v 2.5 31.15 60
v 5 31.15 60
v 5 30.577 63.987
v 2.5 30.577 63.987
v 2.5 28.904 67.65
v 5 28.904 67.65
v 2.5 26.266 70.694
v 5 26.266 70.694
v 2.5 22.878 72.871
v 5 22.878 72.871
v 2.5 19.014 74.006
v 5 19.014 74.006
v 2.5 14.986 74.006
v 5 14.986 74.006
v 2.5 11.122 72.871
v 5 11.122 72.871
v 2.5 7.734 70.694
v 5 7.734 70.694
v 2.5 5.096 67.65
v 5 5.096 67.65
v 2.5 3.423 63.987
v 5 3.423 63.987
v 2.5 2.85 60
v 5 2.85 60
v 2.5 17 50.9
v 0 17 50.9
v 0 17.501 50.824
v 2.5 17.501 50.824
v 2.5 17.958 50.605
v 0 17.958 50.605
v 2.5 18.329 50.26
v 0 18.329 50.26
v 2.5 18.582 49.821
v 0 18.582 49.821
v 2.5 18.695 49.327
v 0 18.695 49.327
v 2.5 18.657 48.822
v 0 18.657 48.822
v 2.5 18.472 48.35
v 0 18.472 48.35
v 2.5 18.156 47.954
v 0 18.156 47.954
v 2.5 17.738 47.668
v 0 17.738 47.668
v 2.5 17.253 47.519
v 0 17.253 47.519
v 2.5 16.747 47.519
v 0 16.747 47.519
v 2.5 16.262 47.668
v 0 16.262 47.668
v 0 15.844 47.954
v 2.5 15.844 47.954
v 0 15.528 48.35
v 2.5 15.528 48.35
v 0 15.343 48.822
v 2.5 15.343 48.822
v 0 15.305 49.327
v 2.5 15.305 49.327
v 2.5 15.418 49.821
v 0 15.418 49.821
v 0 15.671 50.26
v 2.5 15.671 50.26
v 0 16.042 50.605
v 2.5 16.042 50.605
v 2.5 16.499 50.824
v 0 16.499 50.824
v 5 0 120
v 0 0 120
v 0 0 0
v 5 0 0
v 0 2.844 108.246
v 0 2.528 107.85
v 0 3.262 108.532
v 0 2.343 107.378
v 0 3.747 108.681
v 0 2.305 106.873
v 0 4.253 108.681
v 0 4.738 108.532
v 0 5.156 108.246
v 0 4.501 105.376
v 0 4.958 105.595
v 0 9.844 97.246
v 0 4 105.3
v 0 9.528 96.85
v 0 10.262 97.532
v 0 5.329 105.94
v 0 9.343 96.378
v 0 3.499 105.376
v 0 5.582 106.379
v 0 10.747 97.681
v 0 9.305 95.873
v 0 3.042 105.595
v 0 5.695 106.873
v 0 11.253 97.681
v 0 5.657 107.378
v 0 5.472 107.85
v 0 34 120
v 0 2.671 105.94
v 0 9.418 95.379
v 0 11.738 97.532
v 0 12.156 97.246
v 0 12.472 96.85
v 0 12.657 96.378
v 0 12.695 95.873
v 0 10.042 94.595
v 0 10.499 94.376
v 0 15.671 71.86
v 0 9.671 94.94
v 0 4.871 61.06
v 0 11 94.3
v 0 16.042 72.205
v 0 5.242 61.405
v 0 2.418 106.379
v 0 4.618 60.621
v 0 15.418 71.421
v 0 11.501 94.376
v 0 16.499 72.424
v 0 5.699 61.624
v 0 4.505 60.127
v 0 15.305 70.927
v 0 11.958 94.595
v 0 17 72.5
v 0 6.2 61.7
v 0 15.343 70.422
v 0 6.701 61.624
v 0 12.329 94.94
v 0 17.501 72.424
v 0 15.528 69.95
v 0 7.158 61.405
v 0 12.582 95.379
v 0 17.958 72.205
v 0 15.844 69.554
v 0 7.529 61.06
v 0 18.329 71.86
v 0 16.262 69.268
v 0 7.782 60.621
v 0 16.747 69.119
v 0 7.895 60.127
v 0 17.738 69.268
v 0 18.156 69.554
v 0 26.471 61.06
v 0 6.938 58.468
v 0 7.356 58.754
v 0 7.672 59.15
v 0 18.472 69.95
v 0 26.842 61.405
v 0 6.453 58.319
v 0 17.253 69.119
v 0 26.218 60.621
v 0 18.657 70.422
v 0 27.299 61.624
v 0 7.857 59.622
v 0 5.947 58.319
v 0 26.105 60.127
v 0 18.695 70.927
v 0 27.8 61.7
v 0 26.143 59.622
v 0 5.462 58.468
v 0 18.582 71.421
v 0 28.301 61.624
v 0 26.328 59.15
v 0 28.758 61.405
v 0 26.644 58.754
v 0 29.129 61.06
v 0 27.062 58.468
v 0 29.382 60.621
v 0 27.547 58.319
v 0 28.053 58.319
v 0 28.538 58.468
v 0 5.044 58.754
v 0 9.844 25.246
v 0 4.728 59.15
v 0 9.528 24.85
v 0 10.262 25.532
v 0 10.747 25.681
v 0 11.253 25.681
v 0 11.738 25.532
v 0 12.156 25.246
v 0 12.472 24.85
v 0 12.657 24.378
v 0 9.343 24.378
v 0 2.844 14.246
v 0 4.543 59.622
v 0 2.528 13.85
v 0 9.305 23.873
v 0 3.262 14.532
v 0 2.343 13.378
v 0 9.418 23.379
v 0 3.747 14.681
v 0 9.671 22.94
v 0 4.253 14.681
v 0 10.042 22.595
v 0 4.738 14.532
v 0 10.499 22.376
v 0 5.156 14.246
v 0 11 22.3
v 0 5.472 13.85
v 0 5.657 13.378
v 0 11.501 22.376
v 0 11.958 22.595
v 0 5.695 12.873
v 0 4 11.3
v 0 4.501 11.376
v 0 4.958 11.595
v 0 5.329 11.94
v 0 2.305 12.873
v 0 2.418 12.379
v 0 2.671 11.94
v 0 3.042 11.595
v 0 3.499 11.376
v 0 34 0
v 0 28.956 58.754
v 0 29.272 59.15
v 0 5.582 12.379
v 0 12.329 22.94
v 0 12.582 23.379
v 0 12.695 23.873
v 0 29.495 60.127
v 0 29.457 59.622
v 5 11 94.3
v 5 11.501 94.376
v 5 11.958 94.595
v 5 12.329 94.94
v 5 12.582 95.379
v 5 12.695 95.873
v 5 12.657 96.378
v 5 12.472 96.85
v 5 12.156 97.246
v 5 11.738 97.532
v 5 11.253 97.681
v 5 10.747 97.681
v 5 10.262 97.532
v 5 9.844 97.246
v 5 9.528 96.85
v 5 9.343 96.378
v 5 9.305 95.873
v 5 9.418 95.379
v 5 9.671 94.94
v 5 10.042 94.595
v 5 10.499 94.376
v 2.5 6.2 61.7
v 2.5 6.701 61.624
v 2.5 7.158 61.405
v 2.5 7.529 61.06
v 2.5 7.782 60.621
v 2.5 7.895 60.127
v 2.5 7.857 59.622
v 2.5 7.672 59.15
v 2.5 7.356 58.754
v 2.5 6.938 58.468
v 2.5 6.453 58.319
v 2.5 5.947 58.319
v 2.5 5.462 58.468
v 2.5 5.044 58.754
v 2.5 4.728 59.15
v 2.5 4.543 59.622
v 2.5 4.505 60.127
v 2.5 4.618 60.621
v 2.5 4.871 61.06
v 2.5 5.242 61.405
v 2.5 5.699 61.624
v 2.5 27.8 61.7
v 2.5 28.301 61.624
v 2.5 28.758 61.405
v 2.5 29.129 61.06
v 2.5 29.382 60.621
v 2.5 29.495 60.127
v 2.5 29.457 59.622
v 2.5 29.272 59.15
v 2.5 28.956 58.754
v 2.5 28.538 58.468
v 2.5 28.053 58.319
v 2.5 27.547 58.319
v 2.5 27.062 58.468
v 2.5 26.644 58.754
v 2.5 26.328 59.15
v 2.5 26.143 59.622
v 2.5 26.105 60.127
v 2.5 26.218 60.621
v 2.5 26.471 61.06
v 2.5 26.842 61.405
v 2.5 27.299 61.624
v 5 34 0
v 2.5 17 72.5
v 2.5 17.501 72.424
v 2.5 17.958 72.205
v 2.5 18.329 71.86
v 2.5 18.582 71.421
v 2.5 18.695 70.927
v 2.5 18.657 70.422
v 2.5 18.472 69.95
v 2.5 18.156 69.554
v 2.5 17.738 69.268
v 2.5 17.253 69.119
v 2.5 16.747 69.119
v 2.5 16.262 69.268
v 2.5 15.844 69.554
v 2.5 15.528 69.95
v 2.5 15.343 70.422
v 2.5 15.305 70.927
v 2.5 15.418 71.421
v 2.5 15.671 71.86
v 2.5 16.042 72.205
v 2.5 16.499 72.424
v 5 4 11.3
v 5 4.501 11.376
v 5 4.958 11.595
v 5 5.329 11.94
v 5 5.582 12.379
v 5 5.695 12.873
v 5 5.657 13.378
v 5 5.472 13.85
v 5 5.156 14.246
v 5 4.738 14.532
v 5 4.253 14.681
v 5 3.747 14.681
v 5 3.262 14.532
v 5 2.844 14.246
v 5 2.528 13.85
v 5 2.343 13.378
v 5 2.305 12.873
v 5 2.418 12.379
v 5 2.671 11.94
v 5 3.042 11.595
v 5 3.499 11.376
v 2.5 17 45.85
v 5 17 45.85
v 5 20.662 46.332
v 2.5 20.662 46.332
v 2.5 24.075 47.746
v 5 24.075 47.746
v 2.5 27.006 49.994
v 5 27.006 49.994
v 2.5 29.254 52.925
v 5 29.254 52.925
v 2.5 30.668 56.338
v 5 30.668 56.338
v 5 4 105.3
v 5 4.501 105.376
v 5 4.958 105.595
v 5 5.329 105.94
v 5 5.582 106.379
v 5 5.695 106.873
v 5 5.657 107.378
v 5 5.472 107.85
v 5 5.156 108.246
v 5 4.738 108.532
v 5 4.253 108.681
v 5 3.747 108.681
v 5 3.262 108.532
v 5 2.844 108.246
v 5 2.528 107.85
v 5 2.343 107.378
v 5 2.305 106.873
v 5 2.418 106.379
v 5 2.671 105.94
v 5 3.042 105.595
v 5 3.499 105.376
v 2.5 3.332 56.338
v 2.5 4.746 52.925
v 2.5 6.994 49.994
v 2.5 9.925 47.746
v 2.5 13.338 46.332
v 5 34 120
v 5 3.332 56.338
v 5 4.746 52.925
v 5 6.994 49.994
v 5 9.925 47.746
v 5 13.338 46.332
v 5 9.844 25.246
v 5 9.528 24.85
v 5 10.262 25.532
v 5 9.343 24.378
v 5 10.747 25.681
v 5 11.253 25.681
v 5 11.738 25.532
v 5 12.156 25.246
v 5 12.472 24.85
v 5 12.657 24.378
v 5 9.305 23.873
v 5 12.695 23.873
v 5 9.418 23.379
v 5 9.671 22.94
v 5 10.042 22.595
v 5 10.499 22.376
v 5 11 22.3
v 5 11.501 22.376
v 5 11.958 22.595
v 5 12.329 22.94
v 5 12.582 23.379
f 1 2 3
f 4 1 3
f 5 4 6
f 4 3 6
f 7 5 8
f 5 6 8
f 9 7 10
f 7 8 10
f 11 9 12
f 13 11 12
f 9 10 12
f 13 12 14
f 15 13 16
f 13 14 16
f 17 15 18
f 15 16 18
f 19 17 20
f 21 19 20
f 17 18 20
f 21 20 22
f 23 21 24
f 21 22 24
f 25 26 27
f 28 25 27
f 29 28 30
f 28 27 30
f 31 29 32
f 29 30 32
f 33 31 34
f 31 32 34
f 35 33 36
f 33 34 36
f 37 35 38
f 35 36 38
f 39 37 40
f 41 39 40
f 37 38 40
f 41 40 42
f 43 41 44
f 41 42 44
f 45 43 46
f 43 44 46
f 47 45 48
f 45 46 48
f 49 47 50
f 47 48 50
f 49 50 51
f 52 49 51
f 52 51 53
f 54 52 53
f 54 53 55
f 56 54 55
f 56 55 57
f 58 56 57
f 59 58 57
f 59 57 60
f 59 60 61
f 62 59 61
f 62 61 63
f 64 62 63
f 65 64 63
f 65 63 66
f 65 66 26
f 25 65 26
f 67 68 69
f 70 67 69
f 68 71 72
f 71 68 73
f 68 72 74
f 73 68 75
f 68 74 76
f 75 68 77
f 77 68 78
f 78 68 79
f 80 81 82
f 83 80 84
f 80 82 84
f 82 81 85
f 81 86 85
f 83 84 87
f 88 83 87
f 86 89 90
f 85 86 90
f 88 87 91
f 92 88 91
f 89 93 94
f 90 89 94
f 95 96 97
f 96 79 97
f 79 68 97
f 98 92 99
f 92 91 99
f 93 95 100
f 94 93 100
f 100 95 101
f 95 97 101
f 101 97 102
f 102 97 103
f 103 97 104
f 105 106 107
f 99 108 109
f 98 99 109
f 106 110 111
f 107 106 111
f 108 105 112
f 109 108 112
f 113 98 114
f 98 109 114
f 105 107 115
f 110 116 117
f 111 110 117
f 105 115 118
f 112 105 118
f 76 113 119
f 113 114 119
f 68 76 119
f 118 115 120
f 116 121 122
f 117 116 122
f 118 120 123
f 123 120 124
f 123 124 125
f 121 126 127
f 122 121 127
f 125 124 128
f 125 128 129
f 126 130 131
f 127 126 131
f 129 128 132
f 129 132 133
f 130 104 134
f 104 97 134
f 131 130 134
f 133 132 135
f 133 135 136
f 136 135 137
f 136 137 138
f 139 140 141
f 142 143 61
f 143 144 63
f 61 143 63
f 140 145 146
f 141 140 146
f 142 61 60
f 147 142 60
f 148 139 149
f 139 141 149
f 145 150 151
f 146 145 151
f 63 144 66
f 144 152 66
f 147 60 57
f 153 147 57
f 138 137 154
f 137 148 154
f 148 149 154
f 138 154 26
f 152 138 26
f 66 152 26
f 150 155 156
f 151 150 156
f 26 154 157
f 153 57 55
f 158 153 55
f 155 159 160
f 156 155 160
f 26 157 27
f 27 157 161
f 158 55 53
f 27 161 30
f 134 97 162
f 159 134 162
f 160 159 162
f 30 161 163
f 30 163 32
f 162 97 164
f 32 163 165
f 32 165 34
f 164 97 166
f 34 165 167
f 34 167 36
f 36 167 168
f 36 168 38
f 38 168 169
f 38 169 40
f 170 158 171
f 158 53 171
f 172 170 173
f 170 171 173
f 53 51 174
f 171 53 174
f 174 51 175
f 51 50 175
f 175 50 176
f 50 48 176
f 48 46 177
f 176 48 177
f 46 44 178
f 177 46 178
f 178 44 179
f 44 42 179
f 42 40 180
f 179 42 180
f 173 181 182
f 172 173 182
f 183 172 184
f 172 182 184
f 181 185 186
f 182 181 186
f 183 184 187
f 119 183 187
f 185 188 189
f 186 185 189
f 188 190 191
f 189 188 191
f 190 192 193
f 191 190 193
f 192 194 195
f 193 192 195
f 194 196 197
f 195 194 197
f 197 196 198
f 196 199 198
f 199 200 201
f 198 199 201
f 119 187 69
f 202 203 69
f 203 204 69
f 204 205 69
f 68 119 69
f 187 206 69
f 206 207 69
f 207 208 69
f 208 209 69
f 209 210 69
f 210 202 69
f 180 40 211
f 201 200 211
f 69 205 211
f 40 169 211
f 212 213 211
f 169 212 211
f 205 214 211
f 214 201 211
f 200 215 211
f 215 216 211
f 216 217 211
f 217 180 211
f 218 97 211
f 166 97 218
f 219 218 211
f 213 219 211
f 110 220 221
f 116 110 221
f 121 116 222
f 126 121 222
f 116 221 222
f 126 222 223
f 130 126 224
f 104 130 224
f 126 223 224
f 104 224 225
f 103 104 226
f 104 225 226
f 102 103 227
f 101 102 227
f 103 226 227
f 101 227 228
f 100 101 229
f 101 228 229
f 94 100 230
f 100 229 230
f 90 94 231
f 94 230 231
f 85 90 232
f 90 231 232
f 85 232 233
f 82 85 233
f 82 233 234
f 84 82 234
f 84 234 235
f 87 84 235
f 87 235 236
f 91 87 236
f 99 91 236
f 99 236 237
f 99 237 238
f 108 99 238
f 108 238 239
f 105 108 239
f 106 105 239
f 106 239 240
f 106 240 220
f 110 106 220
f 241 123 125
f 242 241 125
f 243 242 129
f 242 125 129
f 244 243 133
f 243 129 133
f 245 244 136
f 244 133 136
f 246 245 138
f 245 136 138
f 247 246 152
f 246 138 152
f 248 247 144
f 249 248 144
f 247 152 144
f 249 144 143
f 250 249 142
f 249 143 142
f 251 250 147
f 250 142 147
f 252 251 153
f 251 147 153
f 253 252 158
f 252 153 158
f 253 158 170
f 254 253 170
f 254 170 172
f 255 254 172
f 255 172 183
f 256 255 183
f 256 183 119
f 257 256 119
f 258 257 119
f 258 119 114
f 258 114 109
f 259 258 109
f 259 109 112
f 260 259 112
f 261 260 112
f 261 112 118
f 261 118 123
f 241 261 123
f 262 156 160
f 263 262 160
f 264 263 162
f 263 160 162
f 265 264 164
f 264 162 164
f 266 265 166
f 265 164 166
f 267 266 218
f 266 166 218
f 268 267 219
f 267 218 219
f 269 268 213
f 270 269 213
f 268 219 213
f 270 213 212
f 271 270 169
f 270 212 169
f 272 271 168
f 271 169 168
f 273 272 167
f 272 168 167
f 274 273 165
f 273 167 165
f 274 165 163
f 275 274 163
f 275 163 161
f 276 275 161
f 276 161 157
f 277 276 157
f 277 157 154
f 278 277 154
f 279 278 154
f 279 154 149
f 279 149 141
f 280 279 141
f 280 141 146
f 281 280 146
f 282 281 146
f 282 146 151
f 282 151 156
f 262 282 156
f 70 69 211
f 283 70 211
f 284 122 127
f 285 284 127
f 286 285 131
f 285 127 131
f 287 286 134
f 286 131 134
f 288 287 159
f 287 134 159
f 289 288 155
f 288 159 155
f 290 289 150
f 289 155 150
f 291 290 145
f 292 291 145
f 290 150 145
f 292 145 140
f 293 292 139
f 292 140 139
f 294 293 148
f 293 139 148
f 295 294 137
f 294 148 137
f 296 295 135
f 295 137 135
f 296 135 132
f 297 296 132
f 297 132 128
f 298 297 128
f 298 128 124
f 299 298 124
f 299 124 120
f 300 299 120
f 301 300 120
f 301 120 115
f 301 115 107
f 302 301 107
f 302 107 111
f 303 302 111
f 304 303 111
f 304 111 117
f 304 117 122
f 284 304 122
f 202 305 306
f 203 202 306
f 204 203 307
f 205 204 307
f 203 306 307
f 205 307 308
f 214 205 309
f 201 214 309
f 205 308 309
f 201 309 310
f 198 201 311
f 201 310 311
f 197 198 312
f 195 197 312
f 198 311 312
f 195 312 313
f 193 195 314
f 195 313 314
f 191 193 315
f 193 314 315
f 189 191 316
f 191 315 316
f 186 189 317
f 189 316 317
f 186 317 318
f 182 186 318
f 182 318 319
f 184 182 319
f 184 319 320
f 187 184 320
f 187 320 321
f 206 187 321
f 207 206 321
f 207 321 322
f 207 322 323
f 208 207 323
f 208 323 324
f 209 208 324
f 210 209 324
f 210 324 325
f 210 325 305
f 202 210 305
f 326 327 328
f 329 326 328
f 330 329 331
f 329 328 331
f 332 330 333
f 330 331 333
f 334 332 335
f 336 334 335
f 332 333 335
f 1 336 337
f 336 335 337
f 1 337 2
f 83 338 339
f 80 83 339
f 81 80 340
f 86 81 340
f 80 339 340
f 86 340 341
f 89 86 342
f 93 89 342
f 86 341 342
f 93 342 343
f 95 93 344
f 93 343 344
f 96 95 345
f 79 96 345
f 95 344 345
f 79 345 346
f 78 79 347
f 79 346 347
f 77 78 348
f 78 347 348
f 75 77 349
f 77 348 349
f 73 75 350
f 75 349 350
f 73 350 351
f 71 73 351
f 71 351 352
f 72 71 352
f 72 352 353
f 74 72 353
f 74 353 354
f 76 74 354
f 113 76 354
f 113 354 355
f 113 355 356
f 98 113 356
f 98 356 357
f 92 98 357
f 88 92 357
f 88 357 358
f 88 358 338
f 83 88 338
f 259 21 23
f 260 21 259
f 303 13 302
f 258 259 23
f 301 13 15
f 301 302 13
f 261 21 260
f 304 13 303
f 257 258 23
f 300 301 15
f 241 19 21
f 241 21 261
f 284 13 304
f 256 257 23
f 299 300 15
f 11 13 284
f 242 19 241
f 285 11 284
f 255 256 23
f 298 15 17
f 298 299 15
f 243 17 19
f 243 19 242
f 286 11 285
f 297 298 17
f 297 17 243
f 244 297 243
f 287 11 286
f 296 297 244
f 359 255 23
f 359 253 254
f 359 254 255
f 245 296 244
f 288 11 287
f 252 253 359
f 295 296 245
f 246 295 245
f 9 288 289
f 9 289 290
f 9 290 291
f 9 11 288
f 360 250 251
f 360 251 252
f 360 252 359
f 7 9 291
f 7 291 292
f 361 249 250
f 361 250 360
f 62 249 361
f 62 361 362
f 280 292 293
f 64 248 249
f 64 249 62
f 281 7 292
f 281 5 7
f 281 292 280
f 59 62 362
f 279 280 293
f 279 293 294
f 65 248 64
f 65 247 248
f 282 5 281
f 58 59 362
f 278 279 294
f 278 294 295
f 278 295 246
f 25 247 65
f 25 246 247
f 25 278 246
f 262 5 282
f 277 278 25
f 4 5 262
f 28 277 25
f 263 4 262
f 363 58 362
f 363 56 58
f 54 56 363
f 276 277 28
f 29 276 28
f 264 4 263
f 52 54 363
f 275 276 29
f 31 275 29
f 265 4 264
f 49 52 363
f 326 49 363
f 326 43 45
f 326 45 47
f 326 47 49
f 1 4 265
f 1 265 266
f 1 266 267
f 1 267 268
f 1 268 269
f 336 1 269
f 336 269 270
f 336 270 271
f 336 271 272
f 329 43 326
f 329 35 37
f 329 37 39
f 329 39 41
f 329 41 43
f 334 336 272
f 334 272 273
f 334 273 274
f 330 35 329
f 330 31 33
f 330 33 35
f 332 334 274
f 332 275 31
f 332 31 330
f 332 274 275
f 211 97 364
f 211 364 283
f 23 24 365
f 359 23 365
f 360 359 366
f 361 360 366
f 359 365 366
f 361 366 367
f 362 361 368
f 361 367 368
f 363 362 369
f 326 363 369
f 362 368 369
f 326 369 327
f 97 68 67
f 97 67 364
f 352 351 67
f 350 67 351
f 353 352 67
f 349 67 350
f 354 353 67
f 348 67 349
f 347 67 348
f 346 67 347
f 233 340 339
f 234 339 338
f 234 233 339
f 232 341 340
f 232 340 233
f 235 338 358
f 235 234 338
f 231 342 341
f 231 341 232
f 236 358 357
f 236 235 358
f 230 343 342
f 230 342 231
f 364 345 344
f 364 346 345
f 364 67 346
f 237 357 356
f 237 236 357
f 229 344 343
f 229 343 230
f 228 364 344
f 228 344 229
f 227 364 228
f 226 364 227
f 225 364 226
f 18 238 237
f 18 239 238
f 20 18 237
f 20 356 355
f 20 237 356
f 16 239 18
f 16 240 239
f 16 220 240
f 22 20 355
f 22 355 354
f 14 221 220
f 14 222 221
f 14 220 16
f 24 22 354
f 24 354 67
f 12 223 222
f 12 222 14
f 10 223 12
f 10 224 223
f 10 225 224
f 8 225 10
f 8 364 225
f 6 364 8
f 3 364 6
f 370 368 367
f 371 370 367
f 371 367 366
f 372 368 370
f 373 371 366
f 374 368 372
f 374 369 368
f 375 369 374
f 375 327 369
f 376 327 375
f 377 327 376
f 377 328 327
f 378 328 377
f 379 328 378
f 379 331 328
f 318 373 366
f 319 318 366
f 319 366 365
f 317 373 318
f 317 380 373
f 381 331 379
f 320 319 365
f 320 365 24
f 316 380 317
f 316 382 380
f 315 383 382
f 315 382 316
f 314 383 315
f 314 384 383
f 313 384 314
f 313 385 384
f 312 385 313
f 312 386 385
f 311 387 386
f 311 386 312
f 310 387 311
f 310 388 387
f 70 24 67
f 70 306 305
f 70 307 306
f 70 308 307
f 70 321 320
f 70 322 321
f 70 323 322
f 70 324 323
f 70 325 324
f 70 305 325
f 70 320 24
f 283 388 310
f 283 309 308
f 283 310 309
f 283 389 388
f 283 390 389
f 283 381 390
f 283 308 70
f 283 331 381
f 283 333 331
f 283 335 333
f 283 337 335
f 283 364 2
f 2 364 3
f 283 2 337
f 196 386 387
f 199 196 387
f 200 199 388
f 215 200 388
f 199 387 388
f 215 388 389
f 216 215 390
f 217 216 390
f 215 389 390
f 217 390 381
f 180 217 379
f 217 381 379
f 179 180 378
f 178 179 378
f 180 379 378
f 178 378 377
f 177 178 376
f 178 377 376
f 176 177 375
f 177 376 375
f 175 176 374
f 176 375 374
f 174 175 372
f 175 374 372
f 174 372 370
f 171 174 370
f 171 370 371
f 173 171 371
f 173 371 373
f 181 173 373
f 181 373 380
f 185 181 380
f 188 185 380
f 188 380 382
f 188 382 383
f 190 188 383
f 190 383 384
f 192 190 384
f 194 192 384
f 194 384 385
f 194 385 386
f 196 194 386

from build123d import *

# Parameters (mm, degrees)
SKETCH1_W                = 120
SKETCH1_H                = 34
BOSS_EXTRUDE1_DEPTH      = 5
CUT_EXTRUDE1_DEPTH       = 2.5
M3_CLEARANCE_HOLE1_D     = 3.4
M3_CLEARANCE_HOLE1_DEPTH = 15
M3_CLEARANCE_HOLE1_TIP   = 1.021463052
M3_CLEARANCE_HOLE3_D     = 3.4
M3_CLEARANCE_HOLE3_DEPTH = 15
M3_CLEARANCE_HOLE3_TIP   = 1.021463052


with BuildPart() as part:
    # Sketch1 → Boss-Extrude1 (new body)
    with BuildSketch(Plane(origin=(0, 0, 0), x_dir=(0, 0, -1), z_dir=(1, 0, 0))):
        with Locations((-60, 17)):
            Rectangle(SKETCH1_W, SKETCH1_H)
    extrude(amount=BOSS_EXTRUDE1_DEPTH)

    # Sketch2 → Cut-Extrude1 (cut)
    with BuildSketch(Plane(origin=(5, 0, 0), x_dir=(0, 0, -1), z_dir=(1, 0, 0))):
        with BuildLine():
            ThreePointArc((-45.85, 17), (-49.994439046, 27.005560954), (-60, 31.15))
            Line((-60, 31.15), (-60, 2.85))
            ThreePointArc((-60, 2.85), (-49.994439046, 6.994439046), (-45.85, 17))
        make_face()
        with BuildLine():
            Line((-60, 2.85), (-60, 31.15))
            ThreePointArc((-60, 31.15), (-74.15, 17), (-60, 2.85))
        make_face()
    extrude(amount=-CUT_EXTRUDE1_DEPTH, mode=Mode.SUBTRACT)

    # M3 Clearance Hole1
    with Locations(Plane(origin=(2.5, 0, 0), x_dir=(0, 0, -1), z_dir=(1, 0, 0))):
        with Locations((-60, 27.8), (-49.2, 17), (-60, 6.2), (-70.8, 17)):
            Hole(M3_CLEARANCE_HOLE1_D / 2, depth=M3_CLEARANCE_HOLE1_DEPTH)
            with Locations((0, 0, -(M3_CLEARANCE_HOLE1_DEPTH + M3_CLEARANCE_HOLE1_TIP / 2))):  # 118° drill point
                Cone(0, M3_CLEARANCE_HOLE1_D / 2, M3_CLEARANCE_HOLE1_TIP, mode=Mode.SUBTRACT)

    # M3 Clearance Hole3
    with Locations(Plane.ZY):
        with Locations((24, 11), (13, 4), (96, 11), (107, 4)):
            Hole(M3_CLEARANCE_HOLE3_D / 2, depth=M3_CLEARANCE_HOLE3_DEPTH)
            with Locations((0, 0, -(M3_CLEARANCE_HOLE3_DEPTH + M3_CLEARANCE_HOLE3_TIP / 2))):  # 118° drill point
                Cone(0, M3_CLEARANCE_HOLE3_D / 2, M3_CLEARANCE_HOLE3_TIP, mode=Mode.SUBTRACT)


solid = part.part
